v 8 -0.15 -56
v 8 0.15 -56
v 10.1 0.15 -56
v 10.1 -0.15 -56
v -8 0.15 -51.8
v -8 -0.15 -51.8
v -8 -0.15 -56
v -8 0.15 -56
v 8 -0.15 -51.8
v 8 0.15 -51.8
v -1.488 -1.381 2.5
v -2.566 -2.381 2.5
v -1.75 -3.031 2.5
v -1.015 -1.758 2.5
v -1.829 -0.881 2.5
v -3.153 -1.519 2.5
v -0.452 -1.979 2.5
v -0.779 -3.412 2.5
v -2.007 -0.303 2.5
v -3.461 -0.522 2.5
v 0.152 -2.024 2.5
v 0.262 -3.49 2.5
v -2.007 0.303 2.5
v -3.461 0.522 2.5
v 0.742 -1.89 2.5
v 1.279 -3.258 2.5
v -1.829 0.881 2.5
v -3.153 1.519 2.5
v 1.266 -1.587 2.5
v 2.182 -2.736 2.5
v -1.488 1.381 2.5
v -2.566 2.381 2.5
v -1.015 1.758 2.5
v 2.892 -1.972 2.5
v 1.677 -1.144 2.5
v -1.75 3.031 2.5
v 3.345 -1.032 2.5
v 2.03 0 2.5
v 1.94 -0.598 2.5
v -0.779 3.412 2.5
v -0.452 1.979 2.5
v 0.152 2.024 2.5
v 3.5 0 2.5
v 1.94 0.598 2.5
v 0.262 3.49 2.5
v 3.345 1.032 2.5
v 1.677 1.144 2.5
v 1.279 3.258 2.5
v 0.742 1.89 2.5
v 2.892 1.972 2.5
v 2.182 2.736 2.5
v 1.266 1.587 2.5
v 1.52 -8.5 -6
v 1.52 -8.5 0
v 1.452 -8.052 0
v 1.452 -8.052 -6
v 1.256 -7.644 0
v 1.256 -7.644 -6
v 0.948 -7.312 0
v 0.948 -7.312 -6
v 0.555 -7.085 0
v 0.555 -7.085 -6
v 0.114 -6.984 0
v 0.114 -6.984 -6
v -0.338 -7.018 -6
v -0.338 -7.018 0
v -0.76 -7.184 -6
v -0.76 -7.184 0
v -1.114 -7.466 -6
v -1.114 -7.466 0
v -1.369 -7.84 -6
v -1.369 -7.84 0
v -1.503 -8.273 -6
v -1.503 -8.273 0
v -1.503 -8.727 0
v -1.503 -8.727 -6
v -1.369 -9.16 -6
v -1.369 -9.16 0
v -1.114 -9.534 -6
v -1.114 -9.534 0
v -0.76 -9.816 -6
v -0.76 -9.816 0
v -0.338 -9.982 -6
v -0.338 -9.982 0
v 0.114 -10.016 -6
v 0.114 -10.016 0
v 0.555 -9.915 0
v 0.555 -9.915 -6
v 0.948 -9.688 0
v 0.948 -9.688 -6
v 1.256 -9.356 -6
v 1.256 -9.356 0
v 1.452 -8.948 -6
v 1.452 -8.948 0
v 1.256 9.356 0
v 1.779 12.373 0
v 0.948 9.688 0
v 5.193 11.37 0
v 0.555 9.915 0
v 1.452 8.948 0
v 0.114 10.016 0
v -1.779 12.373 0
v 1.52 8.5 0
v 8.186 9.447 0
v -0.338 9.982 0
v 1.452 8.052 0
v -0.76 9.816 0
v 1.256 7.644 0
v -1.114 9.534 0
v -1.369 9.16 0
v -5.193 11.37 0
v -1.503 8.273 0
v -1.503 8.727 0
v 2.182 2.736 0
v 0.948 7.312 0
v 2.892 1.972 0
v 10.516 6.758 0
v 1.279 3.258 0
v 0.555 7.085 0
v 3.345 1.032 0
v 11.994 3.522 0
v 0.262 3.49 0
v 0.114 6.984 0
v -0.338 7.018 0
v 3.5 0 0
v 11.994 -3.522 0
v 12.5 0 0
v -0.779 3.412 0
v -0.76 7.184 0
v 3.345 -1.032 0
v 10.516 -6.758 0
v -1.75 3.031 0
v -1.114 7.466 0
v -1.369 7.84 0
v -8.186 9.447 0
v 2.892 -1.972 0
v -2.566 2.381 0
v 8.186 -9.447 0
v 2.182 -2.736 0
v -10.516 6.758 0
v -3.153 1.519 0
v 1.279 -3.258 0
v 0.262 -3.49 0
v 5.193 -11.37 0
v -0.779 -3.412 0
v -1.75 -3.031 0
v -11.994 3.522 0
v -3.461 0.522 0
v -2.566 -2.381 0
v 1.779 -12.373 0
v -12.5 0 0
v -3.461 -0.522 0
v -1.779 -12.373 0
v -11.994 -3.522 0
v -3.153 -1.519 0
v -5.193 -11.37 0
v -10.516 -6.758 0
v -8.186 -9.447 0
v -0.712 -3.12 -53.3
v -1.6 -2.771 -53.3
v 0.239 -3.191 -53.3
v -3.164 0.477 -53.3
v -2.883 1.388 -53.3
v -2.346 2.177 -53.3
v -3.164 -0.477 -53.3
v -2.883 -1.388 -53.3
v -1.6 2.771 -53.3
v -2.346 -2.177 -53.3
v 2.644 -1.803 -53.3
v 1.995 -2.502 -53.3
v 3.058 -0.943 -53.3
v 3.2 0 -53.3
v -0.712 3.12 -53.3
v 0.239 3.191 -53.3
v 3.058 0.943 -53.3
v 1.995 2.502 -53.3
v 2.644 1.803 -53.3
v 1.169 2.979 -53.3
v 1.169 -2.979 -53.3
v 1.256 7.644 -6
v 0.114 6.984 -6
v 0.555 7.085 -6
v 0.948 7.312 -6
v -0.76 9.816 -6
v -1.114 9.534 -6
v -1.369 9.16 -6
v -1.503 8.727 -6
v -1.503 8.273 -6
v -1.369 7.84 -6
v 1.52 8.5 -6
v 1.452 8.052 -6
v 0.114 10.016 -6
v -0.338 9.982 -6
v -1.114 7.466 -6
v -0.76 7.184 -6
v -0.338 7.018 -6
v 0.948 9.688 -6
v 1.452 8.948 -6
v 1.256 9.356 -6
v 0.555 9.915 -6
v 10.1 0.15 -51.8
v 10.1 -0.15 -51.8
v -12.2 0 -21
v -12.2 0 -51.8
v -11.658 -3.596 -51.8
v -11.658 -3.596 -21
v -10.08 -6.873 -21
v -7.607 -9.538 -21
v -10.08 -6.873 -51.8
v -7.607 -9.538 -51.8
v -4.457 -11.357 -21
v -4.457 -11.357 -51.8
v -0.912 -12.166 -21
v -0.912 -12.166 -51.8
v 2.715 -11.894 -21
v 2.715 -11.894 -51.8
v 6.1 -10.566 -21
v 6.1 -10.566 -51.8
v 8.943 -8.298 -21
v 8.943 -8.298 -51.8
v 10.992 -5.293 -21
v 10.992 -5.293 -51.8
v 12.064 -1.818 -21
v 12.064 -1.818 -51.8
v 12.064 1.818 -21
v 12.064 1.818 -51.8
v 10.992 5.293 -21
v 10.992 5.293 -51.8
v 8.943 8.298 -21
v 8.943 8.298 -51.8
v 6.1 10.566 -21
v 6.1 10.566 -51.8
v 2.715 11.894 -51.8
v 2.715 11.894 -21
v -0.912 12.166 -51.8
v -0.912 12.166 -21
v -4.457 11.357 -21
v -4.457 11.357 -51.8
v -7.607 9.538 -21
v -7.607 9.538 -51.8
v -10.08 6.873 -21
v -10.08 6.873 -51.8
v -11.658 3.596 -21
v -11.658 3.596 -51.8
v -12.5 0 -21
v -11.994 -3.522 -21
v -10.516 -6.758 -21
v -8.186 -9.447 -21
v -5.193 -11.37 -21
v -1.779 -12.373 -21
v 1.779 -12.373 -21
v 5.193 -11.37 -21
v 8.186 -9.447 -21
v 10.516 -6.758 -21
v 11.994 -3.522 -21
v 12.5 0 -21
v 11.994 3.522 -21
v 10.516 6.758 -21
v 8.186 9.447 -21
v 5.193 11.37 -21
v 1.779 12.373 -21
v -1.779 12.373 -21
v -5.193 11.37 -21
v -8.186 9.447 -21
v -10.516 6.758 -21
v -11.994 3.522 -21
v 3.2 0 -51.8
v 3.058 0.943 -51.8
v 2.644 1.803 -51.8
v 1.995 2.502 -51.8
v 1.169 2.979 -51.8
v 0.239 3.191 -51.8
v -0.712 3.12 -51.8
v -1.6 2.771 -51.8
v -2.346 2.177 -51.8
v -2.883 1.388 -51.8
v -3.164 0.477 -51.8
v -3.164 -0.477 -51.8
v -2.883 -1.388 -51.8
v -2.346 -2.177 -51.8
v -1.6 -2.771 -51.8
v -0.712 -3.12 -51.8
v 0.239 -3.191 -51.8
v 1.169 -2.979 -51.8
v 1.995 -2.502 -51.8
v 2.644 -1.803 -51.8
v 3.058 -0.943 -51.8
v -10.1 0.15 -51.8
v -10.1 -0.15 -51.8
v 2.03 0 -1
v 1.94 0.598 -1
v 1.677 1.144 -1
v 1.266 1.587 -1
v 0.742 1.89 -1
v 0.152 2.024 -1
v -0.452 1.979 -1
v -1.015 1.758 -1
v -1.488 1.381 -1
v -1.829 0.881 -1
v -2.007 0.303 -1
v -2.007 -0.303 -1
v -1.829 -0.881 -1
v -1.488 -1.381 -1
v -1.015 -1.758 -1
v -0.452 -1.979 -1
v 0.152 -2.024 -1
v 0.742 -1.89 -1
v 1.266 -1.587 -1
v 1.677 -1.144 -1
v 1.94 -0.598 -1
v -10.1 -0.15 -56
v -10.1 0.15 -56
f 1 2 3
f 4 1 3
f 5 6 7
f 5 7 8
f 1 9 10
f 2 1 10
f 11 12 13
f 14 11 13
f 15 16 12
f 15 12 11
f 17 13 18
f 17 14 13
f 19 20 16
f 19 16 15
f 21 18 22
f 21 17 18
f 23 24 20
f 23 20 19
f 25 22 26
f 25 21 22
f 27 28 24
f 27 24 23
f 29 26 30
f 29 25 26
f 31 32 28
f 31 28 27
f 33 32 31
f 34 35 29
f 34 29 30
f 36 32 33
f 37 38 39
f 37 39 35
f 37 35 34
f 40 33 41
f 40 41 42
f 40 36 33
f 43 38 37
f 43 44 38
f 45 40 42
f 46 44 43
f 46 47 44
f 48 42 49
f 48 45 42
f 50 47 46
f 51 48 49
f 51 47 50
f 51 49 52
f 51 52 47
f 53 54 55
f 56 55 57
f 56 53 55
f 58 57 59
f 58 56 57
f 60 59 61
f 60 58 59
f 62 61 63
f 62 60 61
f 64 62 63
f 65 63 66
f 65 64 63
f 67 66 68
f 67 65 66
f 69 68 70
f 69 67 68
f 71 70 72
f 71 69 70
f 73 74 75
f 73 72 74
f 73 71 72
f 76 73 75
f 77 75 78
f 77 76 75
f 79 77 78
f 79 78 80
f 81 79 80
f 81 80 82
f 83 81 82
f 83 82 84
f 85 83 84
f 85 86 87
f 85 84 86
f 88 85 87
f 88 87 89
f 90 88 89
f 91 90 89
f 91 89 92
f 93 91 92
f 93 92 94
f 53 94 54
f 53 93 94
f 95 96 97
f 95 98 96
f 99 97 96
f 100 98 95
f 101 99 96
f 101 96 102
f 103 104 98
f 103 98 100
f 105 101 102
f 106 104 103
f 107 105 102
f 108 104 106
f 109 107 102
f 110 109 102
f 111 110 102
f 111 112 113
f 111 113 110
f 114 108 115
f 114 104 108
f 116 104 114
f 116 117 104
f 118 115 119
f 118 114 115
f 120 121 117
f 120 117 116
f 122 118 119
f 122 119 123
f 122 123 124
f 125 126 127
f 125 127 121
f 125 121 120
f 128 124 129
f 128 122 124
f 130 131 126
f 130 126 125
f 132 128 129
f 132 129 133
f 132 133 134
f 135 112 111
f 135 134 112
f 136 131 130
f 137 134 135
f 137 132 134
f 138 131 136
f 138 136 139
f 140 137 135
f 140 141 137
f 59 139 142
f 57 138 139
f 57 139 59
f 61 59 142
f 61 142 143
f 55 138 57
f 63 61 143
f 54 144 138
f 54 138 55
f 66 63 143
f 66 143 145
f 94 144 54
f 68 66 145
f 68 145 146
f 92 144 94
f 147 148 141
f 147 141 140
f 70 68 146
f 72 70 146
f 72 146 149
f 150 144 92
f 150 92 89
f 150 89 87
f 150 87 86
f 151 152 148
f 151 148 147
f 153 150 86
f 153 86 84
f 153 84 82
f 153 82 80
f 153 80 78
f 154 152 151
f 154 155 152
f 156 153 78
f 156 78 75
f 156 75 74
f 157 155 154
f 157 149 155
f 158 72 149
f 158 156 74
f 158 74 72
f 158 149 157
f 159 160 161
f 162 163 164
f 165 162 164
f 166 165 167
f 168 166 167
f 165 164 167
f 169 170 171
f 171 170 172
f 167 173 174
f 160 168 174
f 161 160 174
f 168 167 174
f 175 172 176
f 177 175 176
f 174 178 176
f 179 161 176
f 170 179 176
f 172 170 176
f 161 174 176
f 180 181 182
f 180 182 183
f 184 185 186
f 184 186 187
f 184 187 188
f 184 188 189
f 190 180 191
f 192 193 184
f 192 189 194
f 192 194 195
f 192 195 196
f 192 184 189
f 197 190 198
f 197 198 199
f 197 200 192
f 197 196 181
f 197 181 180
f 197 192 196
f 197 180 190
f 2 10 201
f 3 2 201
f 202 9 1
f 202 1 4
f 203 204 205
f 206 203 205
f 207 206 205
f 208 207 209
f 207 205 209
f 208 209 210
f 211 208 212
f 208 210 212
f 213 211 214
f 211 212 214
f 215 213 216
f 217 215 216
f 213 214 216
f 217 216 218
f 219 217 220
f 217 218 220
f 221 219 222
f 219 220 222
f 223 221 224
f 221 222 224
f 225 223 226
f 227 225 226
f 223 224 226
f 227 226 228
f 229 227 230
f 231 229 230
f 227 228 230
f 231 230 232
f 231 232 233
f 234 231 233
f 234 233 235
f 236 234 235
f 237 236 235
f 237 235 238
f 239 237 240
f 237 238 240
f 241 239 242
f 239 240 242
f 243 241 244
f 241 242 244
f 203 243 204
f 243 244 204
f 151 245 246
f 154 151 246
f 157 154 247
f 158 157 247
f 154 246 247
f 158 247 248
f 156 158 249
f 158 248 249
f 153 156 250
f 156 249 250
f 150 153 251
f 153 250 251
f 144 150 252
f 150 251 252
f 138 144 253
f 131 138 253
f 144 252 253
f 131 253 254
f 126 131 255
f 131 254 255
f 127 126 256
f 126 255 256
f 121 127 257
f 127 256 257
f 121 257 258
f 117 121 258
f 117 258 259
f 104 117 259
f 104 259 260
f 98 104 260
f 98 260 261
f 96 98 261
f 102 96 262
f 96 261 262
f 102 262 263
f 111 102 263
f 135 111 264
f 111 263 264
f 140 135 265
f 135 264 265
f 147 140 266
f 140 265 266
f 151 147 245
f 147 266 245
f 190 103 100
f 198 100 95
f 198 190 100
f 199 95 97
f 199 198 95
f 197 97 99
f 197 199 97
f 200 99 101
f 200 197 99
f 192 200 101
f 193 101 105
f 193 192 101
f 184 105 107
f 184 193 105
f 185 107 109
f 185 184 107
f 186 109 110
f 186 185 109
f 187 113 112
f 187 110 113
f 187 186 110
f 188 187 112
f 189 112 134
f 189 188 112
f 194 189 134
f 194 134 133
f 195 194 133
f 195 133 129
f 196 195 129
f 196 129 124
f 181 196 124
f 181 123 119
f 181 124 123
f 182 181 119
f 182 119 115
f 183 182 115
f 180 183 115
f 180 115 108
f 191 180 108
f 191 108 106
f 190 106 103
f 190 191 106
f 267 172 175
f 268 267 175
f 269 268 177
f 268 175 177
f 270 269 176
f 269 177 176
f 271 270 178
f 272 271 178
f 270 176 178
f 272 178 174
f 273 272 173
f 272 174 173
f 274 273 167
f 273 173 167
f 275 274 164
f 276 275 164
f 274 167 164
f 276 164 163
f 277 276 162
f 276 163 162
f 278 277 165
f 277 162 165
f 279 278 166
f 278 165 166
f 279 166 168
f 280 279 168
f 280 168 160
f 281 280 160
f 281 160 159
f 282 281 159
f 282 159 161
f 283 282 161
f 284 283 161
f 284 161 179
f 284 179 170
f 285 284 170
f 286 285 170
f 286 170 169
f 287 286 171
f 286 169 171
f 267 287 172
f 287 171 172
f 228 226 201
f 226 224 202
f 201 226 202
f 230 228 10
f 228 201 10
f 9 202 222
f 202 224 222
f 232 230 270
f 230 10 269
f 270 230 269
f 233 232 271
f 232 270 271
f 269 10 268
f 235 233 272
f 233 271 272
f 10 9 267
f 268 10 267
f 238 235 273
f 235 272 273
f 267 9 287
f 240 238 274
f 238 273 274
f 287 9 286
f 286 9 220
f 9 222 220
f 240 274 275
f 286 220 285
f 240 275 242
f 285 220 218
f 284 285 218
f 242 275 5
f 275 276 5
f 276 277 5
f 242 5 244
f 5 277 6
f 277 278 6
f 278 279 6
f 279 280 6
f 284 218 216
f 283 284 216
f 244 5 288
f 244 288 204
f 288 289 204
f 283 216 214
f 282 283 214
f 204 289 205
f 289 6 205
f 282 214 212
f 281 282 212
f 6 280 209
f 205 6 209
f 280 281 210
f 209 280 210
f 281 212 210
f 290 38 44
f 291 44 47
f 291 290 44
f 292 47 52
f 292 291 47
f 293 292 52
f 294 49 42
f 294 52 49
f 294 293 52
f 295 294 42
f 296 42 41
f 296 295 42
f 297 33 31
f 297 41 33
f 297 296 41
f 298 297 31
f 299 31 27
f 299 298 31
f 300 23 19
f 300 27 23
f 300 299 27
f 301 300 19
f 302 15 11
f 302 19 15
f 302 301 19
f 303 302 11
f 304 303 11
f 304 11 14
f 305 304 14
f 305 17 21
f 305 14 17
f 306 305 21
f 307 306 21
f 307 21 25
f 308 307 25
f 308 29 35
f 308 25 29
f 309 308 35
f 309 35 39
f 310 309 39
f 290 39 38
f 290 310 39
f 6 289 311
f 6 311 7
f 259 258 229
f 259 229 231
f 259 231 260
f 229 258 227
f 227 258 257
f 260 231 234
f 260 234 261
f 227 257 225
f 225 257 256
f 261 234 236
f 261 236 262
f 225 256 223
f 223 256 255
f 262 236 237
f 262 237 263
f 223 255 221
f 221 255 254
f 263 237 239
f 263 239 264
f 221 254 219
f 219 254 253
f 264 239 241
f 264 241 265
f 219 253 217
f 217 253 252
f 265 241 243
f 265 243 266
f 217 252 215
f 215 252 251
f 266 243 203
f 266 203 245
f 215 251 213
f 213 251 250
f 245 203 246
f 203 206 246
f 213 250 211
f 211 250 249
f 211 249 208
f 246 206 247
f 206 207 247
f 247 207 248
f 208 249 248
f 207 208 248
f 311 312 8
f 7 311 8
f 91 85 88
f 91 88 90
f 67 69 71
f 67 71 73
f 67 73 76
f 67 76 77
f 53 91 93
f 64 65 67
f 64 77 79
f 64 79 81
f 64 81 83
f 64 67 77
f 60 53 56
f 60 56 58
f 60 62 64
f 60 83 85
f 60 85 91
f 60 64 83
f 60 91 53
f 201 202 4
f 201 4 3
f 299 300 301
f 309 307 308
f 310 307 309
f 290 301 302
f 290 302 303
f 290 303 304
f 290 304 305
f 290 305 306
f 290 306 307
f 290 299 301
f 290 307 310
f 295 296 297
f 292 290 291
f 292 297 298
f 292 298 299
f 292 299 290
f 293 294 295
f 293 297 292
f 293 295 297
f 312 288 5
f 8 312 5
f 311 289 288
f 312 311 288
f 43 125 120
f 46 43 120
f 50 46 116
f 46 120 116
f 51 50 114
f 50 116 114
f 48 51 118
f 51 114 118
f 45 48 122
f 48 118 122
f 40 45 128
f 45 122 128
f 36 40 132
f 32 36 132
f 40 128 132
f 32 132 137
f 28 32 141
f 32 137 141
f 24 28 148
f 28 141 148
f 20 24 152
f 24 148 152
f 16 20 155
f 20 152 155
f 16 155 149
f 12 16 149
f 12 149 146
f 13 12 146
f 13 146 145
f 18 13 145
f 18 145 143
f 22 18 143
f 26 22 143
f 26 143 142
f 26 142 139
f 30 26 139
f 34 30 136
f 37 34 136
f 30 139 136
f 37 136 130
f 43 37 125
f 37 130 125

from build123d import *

# Parameters (mm, degrees)
F_01_START                                   = -21
S01_25_MM_47_TO_1_GEARBOX_R                  = 12.5
F_01_25_MM_47_TO_1_GEARBOX_DEPTH             = 21
F_02_START                                   = -51.8
S02_24_4_MM_MOTOR_CAN_R                      = 12.2
F_02_24_4_MM_MOTOR_CAN_DEPTH                 = 30.8
F_03_START                                   = -53.3
S03_REAR_SHAFT_BOSS_R                        = 3.2
F_03_REAR_SHAFT_BOSS_DEPTH                   = 1.5
F_04_START                                   = -56
S04_REAR_MOTOR_TERMINAL_1_W                  = 2.1
S04_REAR_MOTOR_TERMINAL_1_H                  = 0.3
F_04_REAR_MOTOR_TERMINAL_1_DEPTH             = 4.2
F_05_START                                   = -56
S05_REAR_MOTOR_TERMINAL_1_W                  = 2.1
S05_REAR_MOTOR_TERMINAL_1_H                  = 0.3
F_05_REAR_MOTOR_TERMINAL_1_DEPTH             = 4.2
F_06_START                                   = -6
S06_FACE_MOUNTING_M3_THREAD_ENVELOPES_R      = 1.52
F_06_FACE_MOUNTING_M3_THREAD_ENVELOPES_DEPTH = 6.1
S07_MOTOR_SHAFT_PILOT_R                      = 3.5
F_07_MOTOR_SHAFT_PILOT_DEPTH                 = 2.5
F_08_START                                   = -1
S08_OUTPUT_SHAFT_CLEARANCE_R                 = 2.03
F_08_OUTPUT_SHAFT_CLEARANCE_DEPTH            = 3.6


with BuildPart() as part:
    # S01 - 25 mm 47-to-1 gearbox → 01 - 25 mm 47-to-1 gearbox (new body)
    with BuildSketch(Plane.XY.offset(F_01_START)):
        with Locations(Location((0, 0, 0), (0, 0, 180))):
            Circle(S01_25_MM_47_TO_1_GEARBOX_R)
    extrude(amount=F_01_25_MM_47_TO_1_GEARBOX_DEPTH)

    # S02 - 24.4 mm motor can → 02 - 24.4 mm motor can (add)
    with BuildSketch(Plane.XY.offset(F_02_START)):
        with Locations(Location((0, 0, 0), (0, 0, 180))):
            Circle(S02_24_4_MM_MOTOR_CAN_R)
    extrude(amount=F_02_24_4_MM_MOTOR_CAN_DEPTH)

    # S03 - Rear shaft boss → 03 - Rear shaft boss (add)
    with BuildSketch(Plane.XY.offset(F_03_START)):
        Circle(S03_REAR_SHAFT_BOSS_R)
    extrude(amount=F_03_REAR_SHAFT_BOSS_DEPTH)

    # S04 - Rear motor terminal -1 → 04 - Rear motor terminal -1 (add)
    with BuildSketch(Plane.XY.offset(F_04_START)):
        with Locations((-9.05, 0)):
            Rectangle(S04_REAR_MOTOR_TERMINAL_1_W, S04_REAR_MOTOR_TERMINAL_1_H)
    extrude(amount=F_04_REAR_MOTOR_TERMINAL_1_DEPTH)

    # S05 - Rear motor terminal 1 → 05 - Rear motor terminal 1 (add)
    with BuildSketch(Plane.XY.offset(F_05_START)):
        with Locations((9.05, 0)):
            Rectangle(S05_REAR_MOTOR_TERMINAL_1_W, S05_REAR_MOTOR_TERMINAL_1_H)
    extrude(amount=F_05_REAR_MOTOR_TERMINAL_1_DEPTH)

    # S06 - Face mounting M3 thread envelopes → 06 - Face mounting M3 thread envelopes (cut)
    with BuildSketch(Plane.XY.offset(F_06_START)):
        with Locations((0, 8.5)):
            Circle(S06_FACE_MOUNTING_M3_THREAD_ENVELOPES_R)
        with Locations((0, -8.5)):
            Circle(S06_FACE_MOUNTING_M3_THREAD_ENVELOPES_R)
    extrude(amount=F_06_FACE_MOUNTING_M3_THREAD_ENVELOPES_DEPTH, mode=Mode.SUBTRACT)

    # S07 - Motor shaft pilot → 07 - Motor shaft pilot (add)
    with BuildSketch(Plane.XY):
        Circle(S07_MOTOR_SHAFT_PILOT_R)
    extrude(amount=F_07_MOTOR_SHAFT_PILOT_DEPTH)

    # S08 - Output shaft clearance → 08 - Output shaft clearance (cut)
    with BuildSketch(Plane.XY.offset(F_08_START)):
        Circle(S08_OUTPUT_SHAFT_CLEARANCE_R)
    extrude(amount=F_08_OUTPUT_SHAFT_CLEARANCE_DEPTH, mode=Mode.SUBTRACT)


solid = part.part
